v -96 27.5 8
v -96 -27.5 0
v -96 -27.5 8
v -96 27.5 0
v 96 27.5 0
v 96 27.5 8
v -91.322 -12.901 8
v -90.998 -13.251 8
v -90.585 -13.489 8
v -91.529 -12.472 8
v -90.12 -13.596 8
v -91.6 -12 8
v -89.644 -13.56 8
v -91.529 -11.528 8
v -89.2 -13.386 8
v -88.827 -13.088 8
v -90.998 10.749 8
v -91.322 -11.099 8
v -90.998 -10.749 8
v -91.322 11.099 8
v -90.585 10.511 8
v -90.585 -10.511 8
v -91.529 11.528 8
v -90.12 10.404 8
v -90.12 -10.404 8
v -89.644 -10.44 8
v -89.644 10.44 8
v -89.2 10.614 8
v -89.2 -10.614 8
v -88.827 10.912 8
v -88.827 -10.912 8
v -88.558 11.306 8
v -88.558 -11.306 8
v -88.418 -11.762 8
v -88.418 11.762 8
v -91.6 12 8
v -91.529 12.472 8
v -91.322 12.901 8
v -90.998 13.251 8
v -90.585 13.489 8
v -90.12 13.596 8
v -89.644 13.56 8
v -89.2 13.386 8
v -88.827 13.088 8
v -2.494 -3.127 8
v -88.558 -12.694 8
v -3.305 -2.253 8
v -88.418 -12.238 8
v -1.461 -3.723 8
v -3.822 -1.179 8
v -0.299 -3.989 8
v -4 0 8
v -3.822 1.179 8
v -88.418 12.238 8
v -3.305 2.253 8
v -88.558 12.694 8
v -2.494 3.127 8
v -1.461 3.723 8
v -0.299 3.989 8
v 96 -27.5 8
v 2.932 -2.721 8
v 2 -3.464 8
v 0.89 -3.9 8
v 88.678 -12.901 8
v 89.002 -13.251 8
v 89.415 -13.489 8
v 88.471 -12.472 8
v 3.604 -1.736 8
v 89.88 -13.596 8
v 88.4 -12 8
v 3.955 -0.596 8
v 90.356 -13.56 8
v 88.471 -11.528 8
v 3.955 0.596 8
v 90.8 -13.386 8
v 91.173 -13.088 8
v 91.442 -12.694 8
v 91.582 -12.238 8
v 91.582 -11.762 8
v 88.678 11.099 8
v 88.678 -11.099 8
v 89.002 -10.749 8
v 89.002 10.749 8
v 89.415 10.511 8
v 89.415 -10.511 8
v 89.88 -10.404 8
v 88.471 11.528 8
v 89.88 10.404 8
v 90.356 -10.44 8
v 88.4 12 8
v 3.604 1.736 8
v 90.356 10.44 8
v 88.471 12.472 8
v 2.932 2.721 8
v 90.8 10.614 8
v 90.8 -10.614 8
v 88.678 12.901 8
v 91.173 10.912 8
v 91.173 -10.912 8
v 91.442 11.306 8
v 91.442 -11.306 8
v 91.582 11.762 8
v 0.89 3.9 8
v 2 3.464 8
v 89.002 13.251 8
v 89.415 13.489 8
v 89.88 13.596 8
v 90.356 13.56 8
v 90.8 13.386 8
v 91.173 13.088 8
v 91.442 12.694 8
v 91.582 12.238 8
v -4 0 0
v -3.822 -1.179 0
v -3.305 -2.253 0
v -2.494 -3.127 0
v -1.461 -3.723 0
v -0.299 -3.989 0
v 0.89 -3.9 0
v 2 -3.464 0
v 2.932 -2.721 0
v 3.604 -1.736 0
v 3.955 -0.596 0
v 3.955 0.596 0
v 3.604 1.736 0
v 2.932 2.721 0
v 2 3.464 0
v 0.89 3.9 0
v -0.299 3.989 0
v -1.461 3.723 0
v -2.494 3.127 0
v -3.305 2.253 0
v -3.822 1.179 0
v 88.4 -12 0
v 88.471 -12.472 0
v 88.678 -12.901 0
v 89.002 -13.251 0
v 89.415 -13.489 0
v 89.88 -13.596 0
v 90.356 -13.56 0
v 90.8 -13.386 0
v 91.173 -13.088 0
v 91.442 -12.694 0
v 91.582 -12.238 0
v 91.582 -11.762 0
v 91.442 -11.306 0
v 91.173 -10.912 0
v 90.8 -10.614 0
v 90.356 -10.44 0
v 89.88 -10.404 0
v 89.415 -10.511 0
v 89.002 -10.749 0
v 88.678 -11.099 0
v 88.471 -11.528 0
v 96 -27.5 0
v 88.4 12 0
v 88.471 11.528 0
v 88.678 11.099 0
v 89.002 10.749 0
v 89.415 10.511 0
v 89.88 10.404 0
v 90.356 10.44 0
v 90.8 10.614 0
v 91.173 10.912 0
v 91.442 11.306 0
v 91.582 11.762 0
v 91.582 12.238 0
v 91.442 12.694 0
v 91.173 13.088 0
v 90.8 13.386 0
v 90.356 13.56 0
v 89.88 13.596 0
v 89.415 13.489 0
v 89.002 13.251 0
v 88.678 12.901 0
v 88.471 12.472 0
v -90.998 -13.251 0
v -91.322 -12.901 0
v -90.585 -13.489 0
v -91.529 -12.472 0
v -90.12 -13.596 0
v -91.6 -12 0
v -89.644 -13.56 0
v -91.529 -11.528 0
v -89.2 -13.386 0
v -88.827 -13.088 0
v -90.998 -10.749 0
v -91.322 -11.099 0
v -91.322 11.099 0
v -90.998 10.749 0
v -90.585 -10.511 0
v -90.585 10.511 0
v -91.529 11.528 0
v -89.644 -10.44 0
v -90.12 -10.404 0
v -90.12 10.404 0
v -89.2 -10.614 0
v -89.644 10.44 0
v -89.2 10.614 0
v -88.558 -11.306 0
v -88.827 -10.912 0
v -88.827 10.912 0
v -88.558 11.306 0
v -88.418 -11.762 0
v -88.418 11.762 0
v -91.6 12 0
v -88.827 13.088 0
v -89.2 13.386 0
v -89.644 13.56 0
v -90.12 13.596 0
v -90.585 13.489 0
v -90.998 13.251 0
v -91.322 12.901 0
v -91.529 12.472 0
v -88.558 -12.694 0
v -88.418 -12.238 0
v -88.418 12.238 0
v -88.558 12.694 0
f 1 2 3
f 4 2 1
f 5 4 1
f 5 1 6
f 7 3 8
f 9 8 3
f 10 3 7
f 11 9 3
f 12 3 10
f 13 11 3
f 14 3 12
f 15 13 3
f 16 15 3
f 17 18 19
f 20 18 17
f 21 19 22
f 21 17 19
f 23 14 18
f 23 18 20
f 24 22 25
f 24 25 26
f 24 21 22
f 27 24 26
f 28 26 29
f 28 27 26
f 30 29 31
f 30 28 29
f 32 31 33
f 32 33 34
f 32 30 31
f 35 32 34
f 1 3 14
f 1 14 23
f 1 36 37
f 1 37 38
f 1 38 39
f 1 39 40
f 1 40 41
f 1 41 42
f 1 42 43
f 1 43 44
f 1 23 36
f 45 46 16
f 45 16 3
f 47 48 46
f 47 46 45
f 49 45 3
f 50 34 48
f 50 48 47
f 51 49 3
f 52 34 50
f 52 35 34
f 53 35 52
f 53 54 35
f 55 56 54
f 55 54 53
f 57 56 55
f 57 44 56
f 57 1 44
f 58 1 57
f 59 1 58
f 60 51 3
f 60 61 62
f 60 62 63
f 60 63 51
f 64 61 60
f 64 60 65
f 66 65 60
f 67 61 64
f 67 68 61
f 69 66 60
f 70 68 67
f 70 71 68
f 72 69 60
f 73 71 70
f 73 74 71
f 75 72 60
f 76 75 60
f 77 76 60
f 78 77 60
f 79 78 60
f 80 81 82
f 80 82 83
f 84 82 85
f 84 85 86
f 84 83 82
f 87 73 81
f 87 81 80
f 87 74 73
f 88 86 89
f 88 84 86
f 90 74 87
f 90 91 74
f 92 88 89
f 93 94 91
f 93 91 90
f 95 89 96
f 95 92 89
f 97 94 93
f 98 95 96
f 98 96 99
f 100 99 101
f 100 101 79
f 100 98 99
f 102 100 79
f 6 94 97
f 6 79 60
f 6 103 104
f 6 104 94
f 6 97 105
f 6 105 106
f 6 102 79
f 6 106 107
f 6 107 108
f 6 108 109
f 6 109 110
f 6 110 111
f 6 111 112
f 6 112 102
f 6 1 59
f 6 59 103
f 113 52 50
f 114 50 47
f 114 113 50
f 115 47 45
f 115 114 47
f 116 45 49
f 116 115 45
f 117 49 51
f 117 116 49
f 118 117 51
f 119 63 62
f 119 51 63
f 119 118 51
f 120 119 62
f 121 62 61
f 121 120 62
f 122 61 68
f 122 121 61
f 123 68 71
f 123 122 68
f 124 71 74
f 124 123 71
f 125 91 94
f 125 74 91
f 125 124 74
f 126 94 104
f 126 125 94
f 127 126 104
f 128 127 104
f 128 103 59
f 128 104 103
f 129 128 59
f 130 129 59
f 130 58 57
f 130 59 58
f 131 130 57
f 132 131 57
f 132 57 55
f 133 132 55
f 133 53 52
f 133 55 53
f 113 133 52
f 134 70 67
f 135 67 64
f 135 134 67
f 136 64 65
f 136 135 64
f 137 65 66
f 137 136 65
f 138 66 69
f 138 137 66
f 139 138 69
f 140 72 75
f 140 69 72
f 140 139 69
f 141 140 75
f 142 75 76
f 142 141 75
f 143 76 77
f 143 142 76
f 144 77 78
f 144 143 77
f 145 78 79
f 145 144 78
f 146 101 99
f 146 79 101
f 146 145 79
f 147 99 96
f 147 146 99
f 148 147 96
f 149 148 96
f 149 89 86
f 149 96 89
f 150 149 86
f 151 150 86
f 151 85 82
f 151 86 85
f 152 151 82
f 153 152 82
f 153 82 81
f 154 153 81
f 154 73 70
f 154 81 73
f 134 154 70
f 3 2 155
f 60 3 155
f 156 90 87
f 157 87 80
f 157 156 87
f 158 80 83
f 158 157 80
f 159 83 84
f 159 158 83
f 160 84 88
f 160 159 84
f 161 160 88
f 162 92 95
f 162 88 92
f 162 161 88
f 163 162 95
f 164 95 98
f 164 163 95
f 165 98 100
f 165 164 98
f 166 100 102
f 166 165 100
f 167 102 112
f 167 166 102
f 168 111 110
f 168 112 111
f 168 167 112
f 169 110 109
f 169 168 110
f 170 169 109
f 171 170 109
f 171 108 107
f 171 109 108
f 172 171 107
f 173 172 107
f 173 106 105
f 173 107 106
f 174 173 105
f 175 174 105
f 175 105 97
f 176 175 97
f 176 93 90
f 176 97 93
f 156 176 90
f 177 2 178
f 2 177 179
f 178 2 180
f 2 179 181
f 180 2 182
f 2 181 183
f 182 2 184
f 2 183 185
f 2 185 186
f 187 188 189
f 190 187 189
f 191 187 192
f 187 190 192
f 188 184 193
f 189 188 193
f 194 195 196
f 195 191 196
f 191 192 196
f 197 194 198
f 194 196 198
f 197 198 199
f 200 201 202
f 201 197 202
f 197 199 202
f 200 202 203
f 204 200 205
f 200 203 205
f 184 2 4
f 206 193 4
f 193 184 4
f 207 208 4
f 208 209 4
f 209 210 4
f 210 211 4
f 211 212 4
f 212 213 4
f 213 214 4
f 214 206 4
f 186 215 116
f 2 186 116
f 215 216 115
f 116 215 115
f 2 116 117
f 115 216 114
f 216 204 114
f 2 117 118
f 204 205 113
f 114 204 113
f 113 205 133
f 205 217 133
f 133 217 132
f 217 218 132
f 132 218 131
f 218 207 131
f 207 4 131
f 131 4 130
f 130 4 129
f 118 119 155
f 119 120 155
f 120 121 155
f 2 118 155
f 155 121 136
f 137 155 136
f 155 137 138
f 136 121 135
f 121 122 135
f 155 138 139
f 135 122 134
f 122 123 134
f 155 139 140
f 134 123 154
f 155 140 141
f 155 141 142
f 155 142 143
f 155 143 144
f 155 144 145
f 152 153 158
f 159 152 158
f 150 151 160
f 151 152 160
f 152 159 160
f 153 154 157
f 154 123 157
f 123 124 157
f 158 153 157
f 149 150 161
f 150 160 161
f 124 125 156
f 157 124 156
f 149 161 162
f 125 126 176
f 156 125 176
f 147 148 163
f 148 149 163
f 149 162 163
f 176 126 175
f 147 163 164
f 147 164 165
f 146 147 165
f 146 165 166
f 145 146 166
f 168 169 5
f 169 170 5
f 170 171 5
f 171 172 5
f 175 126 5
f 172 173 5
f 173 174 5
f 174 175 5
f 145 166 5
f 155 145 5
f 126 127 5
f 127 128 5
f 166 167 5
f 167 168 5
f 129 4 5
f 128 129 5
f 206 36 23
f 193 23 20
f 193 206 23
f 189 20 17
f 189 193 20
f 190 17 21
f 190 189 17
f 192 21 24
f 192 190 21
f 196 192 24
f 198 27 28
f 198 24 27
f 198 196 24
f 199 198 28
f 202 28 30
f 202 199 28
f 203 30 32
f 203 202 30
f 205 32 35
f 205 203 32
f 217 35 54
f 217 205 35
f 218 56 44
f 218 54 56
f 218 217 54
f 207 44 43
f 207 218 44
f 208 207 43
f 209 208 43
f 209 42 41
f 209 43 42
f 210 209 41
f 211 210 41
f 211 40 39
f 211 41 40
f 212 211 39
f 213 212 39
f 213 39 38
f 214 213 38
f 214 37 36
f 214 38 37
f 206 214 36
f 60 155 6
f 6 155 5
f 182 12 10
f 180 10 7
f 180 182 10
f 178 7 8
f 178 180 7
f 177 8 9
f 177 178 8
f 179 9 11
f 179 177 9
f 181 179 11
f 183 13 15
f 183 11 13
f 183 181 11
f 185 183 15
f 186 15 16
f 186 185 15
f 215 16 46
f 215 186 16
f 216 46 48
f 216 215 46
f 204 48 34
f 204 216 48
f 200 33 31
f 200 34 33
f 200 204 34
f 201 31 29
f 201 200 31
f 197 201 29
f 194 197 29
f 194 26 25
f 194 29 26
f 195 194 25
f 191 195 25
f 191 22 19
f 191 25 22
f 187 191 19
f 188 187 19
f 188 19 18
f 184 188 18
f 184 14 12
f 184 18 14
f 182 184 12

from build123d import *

# Parameters (mm, degrees)
SKETCH1_W           = 192
SKETCH1_H           = 55
BOSS_EXTRUDE1_DEPTH = 8
SKETCH2_R           = 4
SKETCH2_R_2         = 1.6
CUT_EXTRUDE2_DEPTH  = 9


with BuildPart() as part:
    # Sketch1 → Boss-Extrude1 (new body)
    with BuildSketch(Plane.XY):
        Rectangle(SKETCH1_W, SKETCH1_H)
    extrude(amount=BOSS_EXTRUDE1_DEPTH)

    # Sketch2 → Cut-Extrude2 (cut)
    with BuildSketch(Plane.XY):
        with Locations(Location((0, 0, 0), (0, 0, 180))):
            Circle(SKETCH2_R)
        with Locations(Location((-90, 12, 0), (0, 0, 180))):
            Circle(SKETCH2_R_2)
        with Locations(Location((-90, -12, 0), (0, 0, 180))):
            Circle(SKETCH2_R_2)
        with Locations(Location((90, 12, 0), (0, 0, 180))):
            Circle(SKETCH2_R_2)
        with Locations(Location((90, -12, 0), (0, 0, 180))):
            Circle(SKETCH2_R_2)
    extrude(amount=CUT_EXTRUDE2_DEPTH, mode=Mode.SUBTRACT)


solid = part.part
